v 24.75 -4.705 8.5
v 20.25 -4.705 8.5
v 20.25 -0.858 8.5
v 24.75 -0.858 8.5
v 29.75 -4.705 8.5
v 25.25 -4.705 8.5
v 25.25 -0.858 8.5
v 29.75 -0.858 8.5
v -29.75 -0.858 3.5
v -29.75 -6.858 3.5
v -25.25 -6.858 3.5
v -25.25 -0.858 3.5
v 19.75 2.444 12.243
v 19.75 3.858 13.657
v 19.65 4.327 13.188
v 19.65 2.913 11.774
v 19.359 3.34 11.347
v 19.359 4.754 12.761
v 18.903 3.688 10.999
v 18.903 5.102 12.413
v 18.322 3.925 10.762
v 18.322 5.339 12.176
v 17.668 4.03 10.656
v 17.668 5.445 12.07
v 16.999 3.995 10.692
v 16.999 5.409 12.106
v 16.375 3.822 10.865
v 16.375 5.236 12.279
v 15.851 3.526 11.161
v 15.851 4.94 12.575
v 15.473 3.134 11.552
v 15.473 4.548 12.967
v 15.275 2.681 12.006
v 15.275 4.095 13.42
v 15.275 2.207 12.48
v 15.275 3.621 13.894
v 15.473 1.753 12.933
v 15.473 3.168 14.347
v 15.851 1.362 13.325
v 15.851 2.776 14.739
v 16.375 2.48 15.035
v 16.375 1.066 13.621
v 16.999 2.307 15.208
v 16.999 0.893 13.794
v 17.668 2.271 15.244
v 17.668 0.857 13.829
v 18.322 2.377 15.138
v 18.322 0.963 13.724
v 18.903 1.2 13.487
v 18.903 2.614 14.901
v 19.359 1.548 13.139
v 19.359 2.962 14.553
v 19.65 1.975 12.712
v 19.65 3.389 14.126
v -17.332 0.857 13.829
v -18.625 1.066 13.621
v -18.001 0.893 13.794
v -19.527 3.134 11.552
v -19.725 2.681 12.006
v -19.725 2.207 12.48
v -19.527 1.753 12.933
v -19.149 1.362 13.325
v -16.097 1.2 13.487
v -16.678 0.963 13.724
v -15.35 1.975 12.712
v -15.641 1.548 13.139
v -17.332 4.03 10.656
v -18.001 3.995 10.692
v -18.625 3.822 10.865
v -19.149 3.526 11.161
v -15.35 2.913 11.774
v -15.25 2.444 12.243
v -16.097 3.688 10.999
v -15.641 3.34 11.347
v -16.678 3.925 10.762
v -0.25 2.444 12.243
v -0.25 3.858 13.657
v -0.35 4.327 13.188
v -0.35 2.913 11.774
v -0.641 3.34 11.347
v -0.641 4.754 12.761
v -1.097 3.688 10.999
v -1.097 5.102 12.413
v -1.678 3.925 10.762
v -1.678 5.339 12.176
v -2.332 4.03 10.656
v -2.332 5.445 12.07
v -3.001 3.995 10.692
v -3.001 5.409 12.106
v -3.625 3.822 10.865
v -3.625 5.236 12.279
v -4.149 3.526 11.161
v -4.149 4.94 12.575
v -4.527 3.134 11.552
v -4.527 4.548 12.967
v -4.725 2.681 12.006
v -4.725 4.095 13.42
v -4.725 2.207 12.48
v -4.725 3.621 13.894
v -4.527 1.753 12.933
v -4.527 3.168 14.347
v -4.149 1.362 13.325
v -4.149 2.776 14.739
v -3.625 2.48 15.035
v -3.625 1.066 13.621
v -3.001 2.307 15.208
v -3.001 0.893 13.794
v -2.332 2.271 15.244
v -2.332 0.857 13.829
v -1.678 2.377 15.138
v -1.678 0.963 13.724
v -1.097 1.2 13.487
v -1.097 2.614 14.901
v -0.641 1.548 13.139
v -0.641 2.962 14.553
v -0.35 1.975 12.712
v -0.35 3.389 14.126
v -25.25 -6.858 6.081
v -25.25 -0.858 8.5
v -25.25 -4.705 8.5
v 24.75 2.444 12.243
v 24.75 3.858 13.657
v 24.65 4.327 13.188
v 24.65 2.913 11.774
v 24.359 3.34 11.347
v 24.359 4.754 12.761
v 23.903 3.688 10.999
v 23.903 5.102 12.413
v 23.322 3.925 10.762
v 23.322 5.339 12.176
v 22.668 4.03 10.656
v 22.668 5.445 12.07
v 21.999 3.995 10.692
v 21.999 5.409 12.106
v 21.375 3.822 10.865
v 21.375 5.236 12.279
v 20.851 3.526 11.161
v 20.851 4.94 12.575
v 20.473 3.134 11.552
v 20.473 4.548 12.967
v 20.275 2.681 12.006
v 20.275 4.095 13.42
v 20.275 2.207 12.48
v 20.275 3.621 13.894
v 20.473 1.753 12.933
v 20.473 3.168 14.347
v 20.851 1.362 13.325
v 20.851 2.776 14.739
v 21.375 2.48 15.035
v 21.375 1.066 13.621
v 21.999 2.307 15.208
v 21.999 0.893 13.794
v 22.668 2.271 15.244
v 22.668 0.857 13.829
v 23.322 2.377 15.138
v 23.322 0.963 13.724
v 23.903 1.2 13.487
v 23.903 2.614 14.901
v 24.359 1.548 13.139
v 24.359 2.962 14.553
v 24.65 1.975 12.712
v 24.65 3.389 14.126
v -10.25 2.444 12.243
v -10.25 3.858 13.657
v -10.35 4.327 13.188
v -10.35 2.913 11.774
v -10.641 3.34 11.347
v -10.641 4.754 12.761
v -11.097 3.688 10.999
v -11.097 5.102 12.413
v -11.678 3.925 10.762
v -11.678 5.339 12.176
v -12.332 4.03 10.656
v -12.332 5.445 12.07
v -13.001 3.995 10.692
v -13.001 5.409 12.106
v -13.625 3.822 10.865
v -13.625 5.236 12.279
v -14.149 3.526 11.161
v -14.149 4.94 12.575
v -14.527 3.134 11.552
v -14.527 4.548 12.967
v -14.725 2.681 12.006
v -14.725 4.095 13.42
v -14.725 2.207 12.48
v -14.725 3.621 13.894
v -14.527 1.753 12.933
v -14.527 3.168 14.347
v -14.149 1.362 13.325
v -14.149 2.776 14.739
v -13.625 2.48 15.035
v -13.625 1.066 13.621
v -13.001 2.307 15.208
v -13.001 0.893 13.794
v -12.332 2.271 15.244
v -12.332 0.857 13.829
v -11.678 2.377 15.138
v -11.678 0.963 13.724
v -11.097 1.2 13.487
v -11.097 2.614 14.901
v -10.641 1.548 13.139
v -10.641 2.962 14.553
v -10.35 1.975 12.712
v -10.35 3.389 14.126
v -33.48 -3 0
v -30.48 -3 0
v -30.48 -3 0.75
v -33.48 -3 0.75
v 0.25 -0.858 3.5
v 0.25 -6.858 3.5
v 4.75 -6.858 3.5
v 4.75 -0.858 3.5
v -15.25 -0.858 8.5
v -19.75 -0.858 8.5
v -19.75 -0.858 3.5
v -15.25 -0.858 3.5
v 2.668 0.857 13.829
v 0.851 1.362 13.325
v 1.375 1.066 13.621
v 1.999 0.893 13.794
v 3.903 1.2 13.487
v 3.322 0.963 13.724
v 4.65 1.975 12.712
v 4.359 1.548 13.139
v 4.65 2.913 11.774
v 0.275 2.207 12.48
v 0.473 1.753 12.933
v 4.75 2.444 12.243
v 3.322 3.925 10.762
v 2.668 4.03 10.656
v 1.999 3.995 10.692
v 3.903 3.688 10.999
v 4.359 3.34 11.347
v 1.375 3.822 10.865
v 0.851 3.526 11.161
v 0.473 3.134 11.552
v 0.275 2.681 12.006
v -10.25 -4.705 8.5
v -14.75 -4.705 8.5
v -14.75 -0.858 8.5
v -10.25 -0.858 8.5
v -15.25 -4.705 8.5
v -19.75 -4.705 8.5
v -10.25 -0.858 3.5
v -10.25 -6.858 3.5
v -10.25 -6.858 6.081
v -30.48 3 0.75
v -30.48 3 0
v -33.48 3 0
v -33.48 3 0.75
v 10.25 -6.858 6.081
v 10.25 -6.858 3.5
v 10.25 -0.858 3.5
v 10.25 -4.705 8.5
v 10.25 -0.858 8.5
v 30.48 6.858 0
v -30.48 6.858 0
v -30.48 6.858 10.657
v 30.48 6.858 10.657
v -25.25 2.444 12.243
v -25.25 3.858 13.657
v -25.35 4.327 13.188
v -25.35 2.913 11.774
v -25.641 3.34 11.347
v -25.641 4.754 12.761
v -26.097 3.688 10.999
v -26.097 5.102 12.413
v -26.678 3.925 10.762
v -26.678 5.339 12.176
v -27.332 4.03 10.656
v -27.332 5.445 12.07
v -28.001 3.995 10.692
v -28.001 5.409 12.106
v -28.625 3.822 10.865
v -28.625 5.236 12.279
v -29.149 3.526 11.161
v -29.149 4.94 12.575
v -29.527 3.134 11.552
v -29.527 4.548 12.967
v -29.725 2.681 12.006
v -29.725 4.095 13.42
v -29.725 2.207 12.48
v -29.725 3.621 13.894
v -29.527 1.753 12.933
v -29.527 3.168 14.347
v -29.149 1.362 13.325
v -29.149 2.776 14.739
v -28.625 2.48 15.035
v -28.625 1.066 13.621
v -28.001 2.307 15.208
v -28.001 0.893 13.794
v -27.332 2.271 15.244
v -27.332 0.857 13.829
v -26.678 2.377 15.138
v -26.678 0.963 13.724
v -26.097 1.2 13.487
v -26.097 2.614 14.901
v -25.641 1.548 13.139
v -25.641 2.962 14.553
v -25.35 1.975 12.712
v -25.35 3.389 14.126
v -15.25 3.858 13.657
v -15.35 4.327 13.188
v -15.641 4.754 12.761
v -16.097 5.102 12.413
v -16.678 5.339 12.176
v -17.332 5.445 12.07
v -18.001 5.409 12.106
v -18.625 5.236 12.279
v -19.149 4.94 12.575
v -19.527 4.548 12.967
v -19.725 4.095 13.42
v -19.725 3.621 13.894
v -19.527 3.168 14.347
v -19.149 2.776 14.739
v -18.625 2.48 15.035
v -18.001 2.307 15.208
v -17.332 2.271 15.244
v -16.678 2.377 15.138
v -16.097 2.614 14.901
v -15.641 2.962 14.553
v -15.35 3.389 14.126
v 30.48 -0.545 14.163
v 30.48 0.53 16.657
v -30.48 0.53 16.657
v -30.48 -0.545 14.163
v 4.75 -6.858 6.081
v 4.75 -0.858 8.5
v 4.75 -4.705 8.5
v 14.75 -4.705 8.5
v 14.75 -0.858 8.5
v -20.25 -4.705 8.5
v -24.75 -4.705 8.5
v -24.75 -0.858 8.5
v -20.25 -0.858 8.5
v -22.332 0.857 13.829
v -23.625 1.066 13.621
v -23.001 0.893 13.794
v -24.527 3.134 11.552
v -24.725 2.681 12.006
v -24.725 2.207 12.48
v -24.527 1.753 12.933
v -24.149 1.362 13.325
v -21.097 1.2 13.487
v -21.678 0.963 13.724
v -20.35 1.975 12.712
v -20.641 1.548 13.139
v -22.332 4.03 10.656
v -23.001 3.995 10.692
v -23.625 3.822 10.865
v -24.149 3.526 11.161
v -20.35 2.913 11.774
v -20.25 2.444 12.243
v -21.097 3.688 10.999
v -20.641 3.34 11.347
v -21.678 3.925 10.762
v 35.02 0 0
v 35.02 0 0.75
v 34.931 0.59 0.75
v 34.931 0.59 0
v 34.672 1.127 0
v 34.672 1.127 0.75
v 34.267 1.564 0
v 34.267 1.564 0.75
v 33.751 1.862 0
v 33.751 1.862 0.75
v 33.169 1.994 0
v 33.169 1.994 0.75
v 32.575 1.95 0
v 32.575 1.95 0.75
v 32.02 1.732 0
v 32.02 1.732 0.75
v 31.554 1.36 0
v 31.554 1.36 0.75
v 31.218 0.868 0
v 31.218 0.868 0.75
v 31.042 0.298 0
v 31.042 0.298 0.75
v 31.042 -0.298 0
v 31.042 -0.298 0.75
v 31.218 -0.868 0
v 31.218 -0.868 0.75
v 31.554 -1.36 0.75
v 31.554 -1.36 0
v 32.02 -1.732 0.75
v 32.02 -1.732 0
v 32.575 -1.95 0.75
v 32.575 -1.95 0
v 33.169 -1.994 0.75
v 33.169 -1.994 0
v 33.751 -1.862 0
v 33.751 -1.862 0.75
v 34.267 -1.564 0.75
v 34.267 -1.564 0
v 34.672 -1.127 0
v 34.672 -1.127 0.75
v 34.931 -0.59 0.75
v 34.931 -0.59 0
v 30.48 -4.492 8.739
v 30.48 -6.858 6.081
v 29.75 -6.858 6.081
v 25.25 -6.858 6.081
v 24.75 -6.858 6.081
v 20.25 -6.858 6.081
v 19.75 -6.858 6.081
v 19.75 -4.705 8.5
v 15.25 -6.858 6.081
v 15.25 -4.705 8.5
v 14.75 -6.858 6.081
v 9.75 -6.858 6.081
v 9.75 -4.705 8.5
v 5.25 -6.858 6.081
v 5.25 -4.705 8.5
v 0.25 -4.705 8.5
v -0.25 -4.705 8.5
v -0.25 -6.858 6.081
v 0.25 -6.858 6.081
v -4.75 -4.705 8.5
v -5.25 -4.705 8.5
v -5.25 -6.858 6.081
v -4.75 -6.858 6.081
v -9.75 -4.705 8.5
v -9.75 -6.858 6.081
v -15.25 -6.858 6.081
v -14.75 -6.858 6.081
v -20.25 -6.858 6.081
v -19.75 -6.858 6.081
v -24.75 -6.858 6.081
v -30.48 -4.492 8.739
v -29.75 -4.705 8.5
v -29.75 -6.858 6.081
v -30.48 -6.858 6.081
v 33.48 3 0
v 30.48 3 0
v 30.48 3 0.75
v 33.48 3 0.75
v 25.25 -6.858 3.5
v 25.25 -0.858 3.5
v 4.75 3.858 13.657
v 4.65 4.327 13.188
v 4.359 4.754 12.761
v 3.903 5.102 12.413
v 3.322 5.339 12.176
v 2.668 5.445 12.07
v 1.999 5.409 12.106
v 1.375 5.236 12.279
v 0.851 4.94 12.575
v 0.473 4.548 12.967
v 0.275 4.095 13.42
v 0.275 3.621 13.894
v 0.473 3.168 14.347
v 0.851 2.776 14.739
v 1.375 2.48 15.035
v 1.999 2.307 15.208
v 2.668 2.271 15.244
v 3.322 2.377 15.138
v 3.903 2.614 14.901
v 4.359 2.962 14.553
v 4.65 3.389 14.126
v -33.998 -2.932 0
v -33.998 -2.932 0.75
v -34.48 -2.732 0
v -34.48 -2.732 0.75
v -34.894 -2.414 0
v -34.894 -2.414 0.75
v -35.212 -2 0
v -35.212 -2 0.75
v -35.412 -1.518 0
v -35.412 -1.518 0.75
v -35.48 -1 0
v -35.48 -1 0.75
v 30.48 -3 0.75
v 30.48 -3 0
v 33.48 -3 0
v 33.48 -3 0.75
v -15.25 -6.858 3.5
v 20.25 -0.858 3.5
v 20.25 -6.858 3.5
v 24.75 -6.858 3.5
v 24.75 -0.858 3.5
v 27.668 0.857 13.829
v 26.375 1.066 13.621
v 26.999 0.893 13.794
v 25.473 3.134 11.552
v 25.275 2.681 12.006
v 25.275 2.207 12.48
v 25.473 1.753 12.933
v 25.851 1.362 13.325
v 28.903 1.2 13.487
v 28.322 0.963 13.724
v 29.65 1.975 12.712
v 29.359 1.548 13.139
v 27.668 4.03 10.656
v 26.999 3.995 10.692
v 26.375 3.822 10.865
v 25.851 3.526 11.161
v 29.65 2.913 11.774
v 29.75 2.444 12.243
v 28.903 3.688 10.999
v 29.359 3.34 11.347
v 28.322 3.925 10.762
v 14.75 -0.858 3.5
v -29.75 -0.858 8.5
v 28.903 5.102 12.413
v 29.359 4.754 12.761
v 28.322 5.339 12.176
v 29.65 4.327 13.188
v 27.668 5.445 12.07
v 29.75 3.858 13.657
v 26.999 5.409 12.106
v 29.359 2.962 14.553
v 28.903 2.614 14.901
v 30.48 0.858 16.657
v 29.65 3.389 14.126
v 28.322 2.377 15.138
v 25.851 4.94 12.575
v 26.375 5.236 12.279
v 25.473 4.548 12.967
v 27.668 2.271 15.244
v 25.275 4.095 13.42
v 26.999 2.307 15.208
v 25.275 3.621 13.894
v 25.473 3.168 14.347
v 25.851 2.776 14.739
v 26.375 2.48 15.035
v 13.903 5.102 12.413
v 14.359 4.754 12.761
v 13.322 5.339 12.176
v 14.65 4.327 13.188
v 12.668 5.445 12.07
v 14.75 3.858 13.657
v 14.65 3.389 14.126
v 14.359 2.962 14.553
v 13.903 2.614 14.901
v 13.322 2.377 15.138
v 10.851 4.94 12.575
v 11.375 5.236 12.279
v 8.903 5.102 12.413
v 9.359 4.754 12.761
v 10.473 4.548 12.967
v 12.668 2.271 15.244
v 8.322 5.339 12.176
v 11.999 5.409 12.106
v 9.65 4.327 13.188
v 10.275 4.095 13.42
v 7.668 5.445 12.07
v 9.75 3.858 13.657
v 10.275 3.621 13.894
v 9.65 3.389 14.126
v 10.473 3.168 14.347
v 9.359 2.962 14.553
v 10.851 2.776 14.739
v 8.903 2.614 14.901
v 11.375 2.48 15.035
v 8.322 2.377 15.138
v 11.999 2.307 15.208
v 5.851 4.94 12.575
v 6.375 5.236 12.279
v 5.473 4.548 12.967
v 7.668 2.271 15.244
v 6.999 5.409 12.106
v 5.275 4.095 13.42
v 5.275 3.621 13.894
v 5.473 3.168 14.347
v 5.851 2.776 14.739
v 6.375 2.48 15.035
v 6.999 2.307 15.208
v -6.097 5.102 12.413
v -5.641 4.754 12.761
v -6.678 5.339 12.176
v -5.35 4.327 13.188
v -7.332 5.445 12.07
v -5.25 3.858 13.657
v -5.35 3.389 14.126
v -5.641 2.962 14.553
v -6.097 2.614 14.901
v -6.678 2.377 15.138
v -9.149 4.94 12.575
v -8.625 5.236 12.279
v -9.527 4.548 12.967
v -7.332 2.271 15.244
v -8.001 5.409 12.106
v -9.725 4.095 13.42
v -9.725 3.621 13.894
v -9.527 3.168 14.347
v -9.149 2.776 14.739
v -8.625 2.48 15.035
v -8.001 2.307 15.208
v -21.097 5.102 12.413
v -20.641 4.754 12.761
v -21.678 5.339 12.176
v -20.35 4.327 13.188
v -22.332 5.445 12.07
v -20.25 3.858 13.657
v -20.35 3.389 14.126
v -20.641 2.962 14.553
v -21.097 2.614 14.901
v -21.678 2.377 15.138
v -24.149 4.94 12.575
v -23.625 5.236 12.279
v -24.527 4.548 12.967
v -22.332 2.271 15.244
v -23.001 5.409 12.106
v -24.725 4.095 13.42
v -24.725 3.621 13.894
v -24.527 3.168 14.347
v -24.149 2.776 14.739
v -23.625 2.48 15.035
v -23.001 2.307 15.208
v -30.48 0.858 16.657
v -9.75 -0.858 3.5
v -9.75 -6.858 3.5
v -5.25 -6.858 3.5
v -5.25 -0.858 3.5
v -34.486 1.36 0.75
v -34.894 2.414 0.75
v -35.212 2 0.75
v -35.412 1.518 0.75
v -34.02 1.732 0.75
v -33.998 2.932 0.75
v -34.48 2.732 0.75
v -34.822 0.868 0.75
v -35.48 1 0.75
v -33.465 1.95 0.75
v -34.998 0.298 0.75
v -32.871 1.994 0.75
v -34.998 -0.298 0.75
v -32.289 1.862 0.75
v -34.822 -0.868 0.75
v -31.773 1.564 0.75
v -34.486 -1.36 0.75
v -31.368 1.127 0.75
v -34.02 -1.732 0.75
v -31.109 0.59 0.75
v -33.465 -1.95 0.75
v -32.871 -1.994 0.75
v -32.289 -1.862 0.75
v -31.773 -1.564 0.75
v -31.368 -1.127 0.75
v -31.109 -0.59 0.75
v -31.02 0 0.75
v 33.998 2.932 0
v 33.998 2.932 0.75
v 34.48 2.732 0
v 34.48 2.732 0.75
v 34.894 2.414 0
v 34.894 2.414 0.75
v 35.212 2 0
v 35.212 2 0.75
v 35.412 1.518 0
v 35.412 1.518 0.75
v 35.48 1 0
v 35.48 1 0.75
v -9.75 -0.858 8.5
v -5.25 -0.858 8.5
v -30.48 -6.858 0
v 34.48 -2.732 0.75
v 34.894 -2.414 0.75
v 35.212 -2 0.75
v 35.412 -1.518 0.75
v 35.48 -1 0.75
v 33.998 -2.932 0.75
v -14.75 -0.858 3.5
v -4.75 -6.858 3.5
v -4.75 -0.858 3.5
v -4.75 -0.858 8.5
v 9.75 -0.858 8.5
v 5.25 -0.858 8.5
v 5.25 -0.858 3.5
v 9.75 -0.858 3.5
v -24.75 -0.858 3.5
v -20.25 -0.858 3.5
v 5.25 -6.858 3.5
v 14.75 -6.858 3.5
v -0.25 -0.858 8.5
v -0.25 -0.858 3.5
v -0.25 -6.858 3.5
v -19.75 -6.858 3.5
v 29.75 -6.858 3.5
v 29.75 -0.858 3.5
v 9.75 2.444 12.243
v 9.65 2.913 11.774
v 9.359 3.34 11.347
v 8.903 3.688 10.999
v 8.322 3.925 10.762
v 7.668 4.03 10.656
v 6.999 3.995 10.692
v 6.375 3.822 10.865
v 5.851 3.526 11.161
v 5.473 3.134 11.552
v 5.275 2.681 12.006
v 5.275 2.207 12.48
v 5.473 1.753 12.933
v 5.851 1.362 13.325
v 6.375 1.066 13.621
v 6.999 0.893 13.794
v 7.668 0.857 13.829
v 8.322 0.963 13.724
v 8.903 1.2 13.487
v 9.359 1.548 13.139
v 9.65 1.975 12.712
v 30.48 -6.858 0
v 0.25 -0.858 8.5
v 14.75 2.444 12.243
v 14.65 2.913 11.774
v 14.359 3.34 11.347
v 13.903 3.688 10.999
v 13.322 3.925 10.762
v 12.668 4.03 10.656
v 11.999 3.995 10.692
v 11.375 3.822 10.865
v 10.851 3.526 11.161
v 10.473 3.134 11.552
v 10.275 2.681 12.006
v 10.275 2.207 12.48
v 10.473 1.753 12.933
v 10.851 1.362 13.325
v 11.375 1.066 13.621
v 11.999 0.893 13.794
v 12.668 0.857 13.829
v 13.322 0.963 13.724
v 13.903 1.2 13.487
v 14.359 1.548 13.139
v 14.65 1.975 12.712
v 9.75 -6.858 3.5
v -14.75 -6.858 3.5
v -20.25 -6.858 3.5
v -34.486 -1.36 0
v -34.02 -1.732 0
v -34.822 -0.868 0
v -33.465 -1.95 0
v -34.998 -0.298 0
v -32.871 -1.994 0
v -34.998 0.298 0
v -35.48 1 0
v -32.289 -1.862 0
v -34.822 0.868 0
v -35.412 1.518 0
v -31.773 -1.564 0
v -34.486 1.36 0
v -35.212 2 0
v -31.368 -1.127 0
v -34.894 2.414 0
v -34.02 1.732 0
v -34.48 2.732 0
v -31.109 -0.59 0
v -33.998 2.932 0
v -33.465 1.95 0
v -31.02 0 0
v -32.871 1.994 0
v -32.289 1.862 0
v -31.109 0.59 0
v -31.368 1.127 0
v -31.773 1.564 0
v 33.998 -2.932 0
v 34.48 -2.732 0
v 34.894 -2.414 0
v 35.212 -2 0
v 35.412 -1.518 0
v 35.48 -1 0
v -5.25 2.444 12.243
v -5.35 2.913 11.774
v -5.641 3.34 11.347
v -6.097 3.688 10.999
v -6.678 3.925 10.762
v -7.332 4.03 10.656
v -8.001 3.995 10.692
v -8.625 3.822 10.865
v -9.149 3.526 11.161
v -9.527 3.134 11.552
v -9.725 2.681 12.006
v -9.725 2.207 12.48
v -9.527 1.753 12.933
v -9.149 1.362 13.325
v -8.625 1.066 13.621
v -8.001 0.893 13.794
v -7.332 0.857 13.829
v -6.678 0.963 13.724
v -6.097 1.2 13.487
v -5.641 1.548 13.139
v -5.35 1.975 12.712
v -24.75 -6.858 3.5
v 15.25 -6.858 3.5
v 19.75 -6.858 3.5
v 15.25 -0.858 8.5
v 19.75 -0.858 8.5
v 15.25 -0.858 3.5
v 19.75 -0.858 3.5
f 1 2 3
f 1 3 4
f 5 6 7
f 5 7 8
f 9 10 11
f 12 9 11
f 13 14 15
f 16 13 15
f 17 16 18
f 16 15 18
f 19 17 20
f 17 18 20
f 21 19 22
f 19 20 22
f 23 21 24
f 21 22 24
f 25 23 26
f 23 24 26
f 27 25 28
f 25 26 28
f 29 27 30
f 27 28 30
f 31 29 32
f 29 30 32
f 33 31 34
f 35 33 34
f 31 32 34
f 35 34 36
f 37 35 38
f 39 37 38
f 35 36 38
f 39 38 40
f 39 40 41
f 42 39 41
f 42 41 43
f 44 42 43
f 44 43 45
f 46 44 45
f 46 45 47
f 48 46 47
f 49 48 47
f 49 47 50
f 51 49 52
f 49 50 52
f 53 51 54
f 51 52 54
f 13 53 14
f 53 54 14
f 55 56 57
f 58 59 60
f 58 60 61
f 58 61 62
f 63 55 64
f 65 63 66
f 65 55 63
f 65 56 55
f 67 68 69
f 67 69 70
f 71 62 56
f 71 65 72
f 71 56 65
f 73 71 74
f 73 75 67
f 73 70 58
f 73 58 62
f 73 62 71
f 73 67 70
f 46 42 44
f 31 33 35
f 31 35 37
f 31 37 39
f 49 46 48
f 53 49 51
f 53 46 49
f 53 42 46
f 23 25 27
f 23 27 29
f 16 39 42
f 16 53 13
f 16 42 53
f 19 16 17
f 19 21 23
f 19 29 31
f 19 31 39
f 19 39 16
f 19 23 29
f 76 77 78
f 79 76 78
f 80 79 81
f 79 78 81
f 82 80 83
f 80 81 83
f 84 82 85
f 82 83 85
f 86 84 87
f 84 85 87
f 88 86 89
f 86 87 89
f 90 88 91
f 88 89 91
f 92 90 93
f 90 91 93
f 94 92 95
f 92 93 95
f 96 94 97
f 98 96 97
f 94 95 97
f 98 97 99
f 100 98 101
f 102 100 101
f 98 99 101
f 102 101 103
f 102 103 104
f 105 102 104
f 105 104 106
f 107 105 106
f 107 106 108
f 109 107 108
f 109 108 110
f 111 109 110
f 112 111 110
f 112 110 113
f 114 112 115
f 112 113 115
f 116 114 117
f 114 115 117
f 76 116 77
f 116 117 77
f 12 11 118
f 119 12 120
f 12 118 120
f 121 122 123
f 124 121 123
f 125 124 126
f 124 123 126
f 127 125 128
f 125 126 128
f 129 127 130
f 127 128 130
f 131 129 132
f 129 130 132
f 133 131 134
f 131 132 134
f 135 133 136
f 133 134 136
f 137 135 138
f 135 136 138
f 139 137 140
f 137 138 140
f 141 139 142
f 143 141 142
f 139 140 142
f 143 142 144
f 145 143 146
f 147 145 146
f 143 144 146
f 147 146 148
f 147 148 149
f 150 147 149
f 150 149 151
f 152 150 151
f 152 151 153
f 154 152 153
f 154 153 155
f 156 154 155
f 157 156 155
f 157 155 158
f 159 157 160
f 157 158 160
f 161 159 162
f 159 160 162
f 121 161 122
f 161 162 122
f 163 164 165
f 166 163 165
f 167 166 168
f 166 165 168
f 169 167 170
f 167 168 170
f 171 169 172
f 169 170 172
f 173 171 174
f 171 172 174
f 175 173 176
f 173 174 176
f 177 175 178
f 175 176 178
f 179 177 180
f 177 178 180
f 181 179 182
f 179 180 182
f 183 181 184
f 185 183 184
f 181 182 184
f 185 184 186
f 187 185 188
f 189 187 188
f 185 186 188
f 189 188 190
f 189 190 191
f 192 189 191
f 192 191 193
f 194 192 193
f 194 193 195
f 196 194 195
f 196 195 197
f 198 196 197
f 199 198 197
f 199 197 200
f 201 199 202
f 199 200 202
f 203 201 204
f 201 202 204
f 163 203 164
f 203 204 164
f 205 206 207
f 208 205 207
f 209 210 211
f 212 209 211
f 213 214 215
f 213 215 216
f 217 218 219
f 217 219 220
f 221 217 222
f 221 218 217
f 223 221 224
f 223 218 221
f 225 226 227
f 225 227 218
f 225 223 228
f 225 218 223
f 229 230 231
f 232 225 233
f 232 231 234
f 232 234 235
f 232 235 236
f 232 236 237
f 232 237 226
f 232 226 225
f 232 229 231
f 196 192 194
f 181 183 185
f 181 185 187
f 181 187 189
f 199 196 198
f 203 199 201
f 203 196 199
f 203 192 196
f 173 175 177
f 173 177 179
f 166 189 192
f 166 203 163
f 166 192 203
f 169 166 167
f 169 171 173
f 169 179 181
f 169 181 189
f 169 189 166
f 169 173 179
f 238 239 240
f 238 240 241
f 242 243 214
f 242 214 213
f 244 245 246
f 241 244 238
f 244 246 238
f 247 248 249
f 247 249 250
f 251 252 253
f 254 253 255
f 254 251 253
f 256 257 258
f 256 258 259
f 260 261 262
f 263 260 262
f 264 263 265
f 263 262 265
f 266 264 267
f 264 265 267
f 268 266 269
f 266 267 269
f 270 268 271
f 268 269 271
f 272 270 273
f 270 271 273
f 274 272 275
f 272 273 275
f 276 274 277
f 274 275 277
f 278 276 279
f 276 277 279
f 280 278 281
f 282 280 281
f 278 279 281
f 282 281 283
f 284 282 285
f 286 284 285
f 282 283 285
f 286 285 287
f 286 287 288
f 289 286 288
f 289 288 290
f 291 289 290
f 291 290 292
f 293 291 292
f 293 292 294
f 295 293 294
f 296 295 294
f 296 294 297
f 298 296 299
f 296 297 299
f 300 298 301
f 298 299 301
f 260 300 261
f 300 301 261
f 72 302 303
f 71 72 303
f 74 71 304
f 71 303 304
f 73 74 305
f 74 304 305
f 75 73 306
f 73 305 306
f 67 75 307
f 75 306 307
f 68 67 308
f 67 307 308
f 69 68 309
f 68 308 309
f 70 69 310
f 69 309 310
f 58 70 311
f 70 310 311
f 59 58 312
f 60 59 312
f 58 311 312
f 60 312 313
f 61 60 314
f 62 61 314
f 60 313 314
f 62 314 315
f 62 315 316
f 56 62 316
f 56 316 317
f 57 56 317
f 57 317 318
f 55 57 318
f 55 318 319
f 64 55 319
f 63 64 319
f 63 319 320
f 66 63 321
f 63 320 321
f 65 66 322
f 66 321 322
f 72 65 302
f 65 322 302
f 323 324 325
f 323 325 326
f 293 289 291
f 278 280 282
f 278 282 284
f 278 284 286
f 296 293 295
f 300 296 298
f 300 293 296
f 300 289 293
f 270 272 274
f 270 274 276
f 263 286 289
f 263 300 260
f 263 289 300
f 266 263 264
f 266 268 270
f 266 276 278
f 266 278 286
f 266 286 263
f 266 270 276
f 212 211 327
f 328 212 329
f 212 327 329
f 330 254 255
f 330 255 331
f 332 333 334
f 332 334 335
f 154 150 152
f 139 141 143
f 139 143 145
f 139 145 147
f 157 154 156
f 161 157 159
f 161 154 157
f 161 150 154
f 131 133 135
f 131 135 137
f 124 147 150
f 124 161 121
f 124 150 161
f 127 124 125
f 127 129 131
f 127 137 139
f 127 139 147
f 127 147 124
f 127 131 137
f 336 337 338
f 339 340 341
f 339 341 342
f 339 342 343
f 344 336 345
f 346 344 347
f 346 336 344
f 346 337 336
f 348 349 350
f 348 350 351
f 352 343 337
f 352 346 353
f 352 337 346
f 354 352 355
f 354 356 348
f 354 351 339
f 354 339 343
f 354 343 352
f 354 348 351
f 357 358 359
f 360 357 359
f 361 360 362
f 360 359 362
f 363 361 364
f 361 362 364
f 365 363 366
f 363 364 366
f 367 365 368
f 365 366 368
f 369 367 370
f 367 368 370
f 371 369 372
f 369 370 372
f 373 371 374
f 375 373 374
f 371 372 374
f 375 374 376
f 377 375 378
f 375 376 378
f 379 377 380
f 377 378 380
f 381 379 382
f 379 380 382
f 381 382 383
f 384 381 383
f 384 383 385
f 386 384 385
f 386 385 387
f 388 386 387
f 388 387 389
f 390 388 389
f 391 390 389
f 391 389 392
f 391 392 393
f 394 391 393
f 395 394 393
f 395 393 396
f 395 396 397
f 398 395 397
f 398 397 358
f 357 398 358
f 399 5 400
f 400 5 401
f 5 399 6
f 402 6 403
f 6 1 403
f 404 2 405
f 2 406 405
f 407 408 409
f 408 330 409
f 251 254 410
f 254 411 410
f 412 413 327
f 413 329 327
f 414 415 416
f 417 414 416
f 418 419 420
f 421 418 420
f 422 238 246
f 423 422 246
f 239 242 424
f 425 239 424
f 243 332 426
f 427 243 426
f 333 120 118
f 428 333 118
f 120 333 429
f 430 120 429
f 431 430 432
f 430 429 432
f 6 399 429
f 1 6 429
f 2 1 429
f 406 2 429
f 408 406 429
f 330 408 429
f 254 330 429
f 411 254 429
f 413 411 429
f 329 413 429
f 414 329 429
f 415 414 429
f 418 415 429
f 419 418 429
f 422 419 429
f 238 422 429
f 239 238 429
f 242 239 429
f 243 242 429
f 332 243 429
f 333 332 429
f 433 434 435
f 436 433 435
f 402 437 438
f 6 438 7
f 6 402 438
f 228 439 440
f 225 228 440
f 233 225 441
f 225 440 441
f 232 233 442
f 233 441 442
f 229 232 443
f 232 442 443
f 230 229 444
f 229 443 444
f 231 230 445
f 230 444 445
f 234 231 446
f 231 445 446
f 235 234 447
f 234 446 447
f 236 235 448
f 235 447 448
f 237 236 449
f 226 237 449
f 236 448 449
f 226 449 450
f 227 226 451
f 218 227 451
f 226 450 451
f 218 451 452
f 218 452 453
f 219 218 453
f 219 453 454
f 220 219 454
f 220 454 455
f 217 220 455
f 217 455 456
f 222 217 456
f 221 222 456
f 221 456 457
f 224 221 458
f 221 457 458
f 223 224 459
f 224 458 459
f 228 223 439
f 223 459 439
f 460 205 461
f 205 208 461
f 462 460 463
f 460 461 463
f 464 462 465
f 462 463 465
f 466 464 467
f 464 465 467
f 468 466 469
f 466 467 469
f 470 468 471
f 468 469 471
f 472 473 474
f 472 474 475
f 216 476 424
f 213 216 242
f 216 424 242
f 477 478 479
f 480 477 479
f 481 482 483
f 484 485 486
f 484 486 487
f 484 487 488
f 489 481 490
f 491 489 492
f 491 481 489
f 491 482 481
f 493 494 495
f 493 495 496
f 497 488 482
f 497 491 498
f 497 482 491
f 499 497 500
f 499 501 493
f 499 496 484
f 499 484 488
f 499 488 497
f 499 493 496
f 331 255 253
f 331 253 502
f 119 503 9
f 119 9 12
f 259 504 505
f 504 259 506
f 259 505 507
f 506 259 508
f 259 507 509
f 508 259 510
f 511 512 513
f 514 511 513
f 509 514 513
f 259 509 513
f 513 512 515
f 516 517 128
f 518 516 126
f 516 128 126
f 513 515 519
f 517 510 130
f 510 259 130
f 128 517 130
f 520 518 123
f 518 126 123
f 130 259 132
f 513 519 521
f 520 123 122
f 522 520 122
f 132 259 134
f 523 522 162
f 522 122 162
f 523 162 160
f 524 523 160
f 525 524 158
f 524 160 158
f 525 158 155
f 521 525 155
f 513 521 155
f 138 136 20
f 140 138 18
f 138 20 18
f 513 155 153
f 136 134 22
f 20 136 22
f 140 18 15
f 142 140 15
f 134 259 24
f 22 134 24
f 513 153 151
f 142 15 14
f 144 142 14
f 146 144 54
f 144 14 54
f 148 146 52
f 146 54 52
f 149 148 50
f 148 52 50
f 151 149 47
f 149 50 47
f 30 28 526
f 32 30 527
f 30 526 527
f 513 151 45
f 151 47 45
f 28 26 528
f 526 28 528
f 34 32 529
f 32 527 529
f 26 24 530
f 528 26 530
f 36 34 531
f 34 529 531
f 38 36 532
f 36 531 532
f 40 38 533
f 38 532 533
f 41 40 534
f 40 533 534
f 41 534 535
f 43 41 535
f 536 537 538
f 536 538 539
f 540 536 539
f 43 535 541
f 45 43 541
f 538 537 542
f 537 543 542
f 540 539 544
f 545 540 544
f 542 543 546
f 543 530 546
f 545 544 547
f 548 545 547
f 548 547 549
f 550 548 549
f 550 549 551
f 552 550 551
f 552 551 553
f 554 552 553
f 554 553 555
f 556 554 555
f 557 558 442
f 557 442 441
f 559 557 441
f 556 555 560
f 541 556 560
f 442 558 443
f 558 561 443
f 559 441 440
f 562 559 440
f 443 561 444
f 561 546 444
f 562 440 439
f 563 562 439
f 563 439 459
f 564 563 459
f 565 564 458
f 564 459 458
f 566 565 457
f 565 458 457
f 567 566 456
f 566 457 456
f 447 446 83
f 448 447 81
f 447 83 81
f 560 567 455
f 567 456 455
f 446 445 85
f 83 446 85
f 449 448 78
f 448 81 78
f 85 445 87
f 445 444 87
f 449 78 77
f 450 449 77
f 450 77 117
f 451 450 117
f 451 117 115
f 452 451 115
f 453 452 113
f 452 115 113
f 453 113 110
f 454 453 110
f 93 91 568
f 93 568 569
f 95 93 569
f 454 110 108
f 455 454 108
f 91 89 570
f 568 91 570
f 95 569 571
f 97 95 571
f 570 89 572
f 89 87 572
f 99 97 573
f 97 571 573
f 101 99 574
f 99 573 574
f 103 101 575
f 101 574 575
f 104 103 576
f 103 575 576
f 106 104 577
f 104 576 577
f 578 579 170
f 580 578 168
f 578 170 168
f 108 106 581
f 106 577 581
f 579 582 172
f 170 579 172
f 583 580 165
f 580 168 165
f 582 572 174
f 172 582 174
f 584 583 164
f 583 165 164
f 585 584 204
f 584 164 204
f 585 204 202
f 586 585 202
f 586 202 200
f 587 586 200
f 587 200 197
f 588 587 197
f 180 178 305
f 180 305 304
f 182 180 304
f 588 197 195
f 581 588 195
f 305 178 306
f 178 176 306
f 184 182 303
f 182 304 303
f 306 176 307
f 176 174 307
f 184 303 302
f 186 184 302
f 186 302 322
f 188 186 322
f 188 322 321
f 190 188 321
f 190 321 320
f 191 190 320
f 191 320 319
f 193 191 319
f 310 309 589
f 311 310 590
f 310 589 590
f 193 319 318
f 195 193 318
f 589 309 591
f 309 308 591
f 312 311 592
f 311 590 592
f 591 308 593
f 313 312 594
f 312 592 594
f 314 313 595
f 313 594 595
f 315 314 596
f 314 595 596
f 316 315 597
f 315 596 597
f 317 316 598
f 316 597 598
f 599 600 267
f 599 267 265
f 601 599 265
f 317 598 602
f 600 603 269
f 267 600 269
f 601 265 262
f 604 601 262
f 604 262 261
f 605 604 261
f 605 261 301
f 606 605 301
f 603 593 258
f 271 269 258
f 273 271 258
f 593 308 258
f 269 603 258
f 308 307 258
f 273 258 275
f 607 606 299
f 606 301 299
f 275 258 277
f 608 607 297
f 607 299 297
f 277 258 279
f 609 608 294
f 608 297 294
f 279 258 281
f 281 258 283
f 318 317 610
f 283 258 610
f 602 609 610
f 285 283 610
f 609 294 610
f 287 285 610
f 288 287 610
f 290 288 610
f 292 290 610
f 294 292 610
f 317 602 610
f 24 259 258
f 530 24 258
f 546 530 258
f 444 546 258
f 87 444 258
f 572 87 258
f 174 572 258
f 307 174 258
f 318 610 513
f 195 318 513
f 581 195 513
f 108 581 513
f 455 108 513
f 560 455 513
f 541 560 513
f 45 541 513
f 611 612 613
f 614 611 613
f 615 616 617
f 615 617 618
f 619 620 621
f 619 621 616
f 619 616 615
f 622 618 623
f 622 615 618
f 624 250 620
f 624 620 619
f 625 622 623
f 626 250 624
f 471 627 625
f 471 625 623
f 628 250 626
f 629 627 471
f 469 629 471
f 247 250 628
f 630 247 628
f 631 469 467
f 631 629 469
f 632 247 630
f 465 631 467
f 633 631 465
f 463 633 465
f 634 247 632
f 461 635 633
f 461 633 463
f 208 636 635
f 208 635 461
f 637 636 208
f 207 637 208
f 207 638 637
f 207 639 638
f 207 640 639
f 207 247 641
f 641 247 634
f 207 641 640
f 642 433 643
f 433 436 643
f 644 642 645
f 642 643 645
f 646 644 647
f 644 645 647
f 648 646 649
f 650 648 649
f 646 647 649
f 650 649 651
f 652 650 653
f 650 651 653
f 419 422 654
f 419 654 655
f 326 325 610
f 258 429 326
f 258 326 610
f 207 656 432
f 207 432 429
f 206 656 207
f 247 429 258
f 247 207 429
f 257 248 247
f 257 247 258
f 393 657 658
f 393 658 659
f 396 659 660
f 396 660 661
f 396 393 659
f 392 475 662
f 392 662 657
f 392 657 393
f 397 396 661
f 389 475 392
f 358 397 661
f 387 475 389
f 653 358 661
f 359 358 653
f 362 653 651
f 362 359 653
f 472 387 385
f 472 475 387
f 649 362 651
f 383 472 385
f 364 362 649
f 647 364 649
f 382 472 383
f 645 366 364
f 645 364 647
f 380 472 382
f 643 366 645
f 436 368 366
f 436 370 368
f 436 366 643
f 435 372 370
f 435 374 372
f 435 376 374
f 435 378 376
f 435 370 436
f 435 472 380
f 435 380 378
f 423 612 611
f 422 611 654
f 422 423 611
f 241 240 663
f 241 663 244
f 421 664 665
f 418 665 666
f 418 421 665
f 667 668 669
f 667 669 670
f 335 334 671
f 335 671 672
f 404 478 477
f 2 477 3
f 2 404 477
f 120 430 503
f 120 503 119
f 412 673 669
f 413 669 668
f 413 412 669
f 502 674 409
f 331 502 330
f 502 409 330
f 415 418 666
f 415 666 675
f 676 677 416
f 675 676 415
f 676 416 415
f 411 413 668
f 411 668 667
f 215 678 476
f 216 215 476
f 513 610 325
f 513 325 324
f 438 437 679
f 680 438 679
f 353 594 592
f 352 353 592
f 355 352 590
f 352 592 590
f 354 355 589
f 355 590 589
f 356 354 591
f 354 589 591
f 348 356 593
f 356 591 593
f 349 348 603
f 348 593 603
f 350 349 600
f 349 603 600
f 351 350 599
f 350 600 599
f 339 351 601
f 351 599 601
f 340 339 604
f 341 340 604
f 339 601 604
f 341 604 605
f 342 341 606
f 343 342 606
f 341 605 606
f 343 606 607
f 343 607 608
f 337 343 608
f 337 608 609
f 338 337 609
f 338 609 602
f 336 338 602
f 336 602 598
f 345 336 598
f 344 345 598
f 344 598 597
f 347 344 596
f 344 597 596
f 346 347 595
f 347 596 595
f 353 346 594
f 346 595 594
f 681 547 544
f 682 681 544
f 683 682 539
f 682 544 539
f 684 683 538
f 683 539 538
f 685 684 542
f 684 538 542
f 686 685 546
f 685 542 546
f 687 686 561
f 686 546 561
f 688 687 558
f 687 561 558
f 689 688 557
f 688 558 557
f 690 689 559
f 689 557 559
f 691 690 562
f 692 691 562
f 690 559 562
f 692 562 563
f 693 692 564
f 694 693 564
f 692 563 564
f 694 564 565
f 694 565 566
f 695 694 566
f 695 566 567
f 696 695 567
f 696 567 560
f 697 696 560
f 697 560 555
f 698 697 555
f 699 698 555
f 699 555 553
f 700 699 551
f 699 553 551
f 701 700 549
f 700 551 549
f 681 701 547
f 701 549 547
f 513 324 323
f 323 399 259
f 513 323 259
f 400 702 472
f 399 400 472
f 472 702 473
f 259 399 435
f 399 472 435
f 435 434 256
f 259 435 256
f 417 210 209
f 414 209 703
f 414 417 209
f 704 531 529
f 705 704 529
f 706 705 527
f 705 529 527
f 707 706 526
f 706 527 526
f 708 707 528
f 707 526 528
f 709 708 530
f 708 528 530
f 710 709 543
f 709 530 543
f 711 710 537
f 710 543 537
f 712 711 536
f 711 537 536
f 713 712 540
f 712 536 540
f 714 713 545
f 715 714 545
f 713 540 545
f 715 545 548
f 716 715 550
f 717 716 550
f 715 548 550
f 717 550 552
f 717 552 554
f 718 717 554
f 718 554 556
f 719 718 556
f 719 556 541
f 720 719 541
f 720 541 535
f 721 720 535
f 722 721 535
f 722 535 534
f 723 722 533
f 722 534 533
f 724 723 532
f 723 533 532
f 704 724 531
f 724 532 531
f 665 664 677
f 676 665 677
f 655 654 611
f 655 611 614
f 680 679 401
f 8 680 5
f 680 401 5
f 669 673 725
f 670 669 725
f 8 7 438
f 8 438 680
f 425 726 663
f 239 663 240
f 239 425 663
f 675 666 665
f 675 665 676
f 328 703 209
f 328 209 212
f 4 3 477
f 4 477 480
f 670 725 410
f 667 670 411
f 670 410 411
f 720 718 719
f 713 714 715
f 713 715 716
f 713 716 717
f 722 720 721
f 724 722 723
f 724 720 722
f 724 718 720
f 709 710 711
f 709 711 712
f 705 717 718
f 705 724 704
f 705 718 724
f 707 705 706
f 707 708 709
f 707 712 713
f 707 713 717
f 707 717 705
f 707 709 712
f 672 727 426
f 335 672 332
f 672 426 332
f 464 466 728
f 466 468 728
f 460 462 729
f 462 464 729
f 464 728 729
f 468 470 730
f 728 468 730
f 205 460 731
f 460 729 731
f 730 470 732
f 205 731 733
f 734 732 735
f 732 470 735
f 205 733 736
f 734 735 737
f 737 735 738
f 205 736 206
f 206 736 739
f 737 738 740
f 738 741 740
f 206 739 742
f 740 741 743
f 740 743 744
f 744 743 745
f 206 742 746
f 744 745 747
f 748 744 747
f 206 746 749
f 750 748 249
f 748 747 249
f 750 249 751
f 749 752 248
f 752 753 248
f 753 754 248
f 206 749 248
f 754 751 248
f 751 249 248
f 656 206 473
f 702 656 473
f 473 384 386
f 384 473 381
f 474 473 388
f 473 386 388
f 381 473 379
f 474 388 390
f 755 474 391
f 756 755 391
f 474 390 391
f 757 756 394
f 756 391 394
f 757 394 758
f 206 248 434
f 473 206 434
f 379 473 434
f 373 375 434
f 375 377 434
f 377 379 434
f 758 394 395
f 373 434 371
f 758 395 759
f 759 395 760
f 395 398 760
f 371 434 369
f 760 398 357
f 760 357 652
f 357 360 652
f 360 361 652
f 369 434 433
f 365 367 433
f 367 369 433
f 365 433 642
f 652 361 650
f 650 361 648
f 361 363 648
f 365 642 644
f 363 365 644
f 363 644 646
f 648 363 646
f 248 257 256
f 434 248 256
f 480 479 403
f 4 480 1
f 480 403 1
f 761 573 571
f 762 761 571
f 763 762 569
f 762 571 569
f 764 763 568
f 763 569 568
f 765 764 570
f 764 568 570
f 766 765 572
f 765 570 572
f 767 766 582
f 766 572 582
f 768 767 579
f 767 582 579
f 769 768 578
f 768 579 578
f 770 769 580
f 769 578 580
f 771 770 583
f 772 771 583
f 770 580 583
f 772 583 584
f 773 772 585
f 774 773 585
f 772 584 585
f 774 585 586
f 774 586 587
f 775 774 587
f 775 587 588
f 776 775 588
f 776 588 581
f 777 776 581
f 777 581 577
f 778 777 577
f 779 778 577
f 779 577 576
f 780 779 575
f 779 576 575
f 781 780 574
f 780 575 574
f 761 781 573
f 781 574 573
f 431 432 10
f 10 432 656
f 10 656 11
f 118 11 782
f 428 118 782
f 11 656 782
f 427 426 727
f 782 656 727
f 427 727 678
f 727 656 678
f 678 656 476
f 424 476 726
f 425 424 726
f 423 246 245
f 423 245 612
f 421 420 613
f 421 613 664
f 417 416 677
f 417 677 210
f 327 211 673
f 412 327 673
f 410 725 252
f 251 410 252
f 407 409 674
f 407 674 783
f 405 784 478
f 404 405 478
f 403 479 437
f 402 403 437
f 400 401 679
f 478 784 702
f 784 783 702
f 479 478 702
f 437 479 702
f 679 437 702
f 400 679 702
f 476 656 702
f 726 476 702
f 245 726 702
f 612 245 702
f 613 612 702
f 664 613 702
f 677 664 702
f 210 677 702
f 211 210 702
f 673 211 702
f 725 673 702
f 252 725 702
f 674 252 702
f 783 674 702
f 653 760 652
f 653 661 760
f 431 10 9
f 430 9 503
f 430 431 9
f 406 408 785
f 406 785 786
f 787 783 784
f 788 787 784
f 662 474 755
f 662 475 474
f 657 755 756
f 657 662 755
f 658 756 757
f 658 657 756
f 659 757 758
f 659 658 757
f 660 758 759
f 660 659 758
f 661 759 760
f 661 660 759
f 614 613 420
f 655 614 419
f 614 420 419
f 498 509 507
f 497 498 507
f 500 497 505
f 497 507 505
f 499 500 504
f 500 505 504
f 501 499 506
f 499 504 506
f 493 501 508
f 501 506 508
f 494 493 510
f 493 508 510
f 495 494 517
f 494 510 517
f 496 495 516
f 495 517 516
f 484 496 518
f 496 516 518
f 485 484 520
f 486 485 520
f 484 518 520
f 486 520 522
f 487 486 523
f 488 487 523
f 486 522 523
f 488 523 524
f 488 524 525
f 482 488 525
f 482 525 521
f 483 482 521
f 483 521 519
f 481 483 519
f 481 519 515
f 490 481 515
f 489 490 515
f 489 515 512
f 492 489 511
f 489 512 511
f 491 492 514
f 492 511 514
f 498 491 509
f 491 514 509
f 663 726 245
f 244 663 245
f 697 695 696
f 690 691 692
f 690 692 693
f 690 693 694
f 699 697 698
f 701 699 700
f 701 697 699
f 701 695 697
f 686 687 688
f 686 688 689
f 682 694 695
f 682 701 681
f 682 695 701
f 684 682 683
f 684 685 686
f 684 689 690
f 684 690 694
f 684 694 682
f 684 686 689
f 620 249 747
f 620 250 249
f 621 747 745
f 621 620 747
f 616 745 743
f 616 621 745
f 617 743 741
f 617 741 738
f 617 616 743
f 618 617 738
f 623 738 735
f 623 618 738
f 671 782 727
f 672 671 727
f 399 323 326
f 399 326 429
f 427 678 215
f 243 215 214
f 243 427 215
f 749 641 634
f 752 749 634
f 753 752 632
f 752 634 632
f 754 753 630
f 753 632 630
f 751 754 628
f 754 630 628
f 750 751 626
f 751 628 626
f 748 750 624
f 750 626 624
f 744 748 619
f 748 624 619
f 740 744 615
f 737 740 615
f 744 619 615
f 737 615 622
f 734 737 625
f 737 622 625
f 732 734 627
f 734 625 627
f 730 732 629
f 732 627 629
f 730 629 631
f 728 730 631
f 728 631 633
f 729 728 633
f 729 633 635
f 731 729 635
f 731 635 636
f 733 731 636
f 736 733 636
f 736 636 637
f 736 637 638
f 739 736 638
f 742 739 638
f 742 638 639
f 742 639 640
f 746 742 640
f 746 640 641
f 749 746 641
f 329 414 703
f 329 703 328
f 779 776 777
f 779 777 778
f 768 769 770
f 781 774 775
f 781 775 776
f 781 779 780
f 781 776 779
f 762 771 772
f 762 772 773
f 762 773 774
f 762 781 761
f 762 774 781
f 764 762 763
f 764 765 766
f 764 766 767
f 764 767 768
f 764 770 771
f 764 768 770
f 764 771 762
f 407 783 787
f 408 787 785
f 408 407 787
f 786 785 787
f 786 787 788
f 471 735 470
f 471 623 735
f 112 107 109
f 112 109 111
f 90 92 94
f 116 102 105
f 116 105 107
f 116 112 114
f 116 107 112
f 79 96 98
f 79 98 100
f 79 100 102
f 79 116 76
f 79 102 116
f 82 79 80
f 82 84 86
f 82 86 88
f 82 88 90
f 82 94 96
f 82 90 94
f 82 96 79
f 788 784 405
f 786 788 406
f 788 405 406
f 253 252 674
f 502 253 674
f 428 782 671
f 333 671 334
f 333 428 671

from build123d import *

# Parameters (mm, degrees)
F0_W      = 60.96
F0_H      = 13.716
F1_DEPTH  = 16.657
F3_DEPTH  = 60.961
F5_W      = 4.5
F5_H      = 5
F4_R      = 2.25
F6_DEPTH  = 6
F7_R      = 2.25
F8_DEPTH  = 2
F9_W      = 6
F9_H      = 0.75
F10_DEPTH = 5
F11_W     = 6
F11_H     = 0.75
F12_DEPTH = 5
F13_R     = 2
F14_R     = 2
F15_DEPTH = 0.751
F16_R     = 2
F17_DEPTH = 0.751


with BuildPart() as f1:
    # F0 (on Top) → F1 (new body)
    with BuildSketch(Plane.XY):
        Rectangle(F0_W, F0_H)
    extrude(amount=F1_DEPTH)

    # F2 (on face) → F3 (cut, through all)
    with BuildSketch(Plane(origin=(-30.48, 0, 0), x_dir=(0, -1, 0), z_dir=(-1, 0, 0))):
        Polygon((-6.858, 10.657), (-0.858, 16.657), (-6.858, 16.657), align=None)
        Polygon((6.858, 16.657), (-0.5295271985, 16.657), (0.5445904681, 14.1634047031), (4.491972737, 8.7391110137), (6.858, 6.0806702822), align=None)
    extrude(amount=-F3_DEPTH, mode=Mode.SUBTRACT)

    # F5 (on face) + F4 (on face) → F6 (cut)
    with BuildSketch(Plane.XZ.offset(6.858)):
        with Locations((-27.5, 6)):
            Rectangle(F5_W, F5_H)
        with Locations((-22.5, 6)):
            Rectangle(F5_W, F5_H)
        with Locations((-17.5, 6)):
            Rectangle(F5_W, F5_H)
        with Locations((-12.5, 6)):
            Rectangle(F5_W, F5_H)
        with Locations((-7.5, 6)):
            Rectangle(F5_W, F5_H)
        with Locations((-2.5, 6)):
            Rectangle(F5_W, F5_H)
        with Locations((2.5, 6)):
            Rectangle(F5_W, F5_H)
        with Locations((7.5, 6)):
            Rectangle(F5_W, F5_H)
        with Locations((12.5, 6)):
            Rectangle(F5_W, F5_H)
        with Locations((17.5, 6)):
            Rectangle(F5_W, F5_H)
        with Locations((22.5, 6)):
            Rectangle(F5_W, F5_H)
        with Locations((27.5, 6)):
            Rectangle(F5_W, F5_H)
    with BuildSketch(Plane(origin=(0, 6.858, 0), x_dir=(-1, 0, 0), z_dir=(0, 1, 0))):
        with Locations((27.5, 5.3285)):
            Circle(F4_R)
        with Locations((22.5, 5.3285)):
            Circle(F4_R)
        with Locations((17.5, 5.3285)):
            Circle(F4_R)
        with Locations((12.5, 5.3285)):
            Circle(F4_R)
        with Locations((7.5, 5.3285)):
            Circle(F4_R)
        with Locations((2.5, 5.3285)):
            Circle(F4_R)
        with Locations((-2.5, 5.3285)):
            Circle(F4_R)
        with Locations((-7.5, 5.3285)):
            Circle(F4_R)
        with Locations((-12.5, 5.3285)):
            Circle(F4_R)
        with Locations((-17.5, 5.3285)):
            Circle(F4_R)
        with Locations((-22.5, 5.3285)):
            Circle(F4_R)
        with Locations((-27.5, 5.3285)):
            Circle(F4_R)
    extrude(amount=-F6_DEPTH, dir=(0, -1, 0), mode=Mode.SUBTRACT)

    # F7 (on face) → F8 (cut)
    with BuildSketch(Plane(origin=(0, 8.7575, 8.7575), x_dir=(1, 0, 0), z_dir=(0, 0.7071067812, 0.7071067812))):
        with Locations((-27.5, -6.9289393488)):
            Circle(F7_R)
        with Locations((-22.5, -6.9289393488)):
            Circle(F7_R)
        with Locations((-17.5, -6.9289393488)):
            Circle(F7_R)
        with Locations((-12.5, -6.9289393488)):
            Circle(F7_R)
        with Locations((-7.5, -6.9289393488)):
            Circle(F7_R)
        with Locations((-2.5, -6.9289393488)):
            Circle(F7_R)
        with Locations((2.5, -6.9289393488)):
            Circle(F7_R)
        with Locations((7.5, -6.9289393488)):
            Circle(F7_R)
        with Locations((12.5, -6.9289393488)):
            Circle(F7_R)
        with Locations((17.5, -6.9289393488)):
            Circle(F7_R)
        with Locations((22.5, -6.9289393488)):
            Circle(F7_R)
        with Locations((27.5, -6.9289393488)):
            Circle(F7_R)
    extrude(amount=-F8_DEPTH, mode=Mode.SUBTRACT)

    # F9 (on face) → F10 (join)
    with BuildSketch(Plane(origin=(-30.48, 0, 0), x_dir=(0, -1, 0), z_dir=(-1, 0, 0))):
        with Locations((0, 0.375)):
            Rectangle(F9_W, F9_H)
    extrude(amount=F10_DEPTH)

    # F11 (on face) → F12 (join)
    with BuildSketch(Plane.YZ.offset(30.48)):
        with Locations((0, 0.375)):
            Rectangle(F11_W, F11_H)
    extrude(amount=F12_DEPTH)

    # F13
    f13_edges = [f1.edges().sort_by_distance(p)[0] for p in [
        (-35.48, 3, 0.375),
        (-35.48, -3, 0.375),
        (35.48, -3, 0.375),
        (35.48, 3, 0.375),
    ]]
    fillet(f13_edges, radius=F13_R)

    # F14 (on face) → F15 (cut, through all)
    with BuildSketch(Plane.XY.offset(0.75)):
        with Locations((-33.02, 0)):
            Circle(F14_R)
    extrude(amount=-F15_DEPTH, mode=Mode.SUBTRACT)

    # F16 (on face) → F17 (cut, through all)
    with BuildSketch(Plane.XY.offset(0.75)):
        with Locations((33.02, 0)):
            Circle(F16_R)
    extrude(amount=-F17_DEPTH, mode=Mode.SUBTRACT)


solid = f1.part
